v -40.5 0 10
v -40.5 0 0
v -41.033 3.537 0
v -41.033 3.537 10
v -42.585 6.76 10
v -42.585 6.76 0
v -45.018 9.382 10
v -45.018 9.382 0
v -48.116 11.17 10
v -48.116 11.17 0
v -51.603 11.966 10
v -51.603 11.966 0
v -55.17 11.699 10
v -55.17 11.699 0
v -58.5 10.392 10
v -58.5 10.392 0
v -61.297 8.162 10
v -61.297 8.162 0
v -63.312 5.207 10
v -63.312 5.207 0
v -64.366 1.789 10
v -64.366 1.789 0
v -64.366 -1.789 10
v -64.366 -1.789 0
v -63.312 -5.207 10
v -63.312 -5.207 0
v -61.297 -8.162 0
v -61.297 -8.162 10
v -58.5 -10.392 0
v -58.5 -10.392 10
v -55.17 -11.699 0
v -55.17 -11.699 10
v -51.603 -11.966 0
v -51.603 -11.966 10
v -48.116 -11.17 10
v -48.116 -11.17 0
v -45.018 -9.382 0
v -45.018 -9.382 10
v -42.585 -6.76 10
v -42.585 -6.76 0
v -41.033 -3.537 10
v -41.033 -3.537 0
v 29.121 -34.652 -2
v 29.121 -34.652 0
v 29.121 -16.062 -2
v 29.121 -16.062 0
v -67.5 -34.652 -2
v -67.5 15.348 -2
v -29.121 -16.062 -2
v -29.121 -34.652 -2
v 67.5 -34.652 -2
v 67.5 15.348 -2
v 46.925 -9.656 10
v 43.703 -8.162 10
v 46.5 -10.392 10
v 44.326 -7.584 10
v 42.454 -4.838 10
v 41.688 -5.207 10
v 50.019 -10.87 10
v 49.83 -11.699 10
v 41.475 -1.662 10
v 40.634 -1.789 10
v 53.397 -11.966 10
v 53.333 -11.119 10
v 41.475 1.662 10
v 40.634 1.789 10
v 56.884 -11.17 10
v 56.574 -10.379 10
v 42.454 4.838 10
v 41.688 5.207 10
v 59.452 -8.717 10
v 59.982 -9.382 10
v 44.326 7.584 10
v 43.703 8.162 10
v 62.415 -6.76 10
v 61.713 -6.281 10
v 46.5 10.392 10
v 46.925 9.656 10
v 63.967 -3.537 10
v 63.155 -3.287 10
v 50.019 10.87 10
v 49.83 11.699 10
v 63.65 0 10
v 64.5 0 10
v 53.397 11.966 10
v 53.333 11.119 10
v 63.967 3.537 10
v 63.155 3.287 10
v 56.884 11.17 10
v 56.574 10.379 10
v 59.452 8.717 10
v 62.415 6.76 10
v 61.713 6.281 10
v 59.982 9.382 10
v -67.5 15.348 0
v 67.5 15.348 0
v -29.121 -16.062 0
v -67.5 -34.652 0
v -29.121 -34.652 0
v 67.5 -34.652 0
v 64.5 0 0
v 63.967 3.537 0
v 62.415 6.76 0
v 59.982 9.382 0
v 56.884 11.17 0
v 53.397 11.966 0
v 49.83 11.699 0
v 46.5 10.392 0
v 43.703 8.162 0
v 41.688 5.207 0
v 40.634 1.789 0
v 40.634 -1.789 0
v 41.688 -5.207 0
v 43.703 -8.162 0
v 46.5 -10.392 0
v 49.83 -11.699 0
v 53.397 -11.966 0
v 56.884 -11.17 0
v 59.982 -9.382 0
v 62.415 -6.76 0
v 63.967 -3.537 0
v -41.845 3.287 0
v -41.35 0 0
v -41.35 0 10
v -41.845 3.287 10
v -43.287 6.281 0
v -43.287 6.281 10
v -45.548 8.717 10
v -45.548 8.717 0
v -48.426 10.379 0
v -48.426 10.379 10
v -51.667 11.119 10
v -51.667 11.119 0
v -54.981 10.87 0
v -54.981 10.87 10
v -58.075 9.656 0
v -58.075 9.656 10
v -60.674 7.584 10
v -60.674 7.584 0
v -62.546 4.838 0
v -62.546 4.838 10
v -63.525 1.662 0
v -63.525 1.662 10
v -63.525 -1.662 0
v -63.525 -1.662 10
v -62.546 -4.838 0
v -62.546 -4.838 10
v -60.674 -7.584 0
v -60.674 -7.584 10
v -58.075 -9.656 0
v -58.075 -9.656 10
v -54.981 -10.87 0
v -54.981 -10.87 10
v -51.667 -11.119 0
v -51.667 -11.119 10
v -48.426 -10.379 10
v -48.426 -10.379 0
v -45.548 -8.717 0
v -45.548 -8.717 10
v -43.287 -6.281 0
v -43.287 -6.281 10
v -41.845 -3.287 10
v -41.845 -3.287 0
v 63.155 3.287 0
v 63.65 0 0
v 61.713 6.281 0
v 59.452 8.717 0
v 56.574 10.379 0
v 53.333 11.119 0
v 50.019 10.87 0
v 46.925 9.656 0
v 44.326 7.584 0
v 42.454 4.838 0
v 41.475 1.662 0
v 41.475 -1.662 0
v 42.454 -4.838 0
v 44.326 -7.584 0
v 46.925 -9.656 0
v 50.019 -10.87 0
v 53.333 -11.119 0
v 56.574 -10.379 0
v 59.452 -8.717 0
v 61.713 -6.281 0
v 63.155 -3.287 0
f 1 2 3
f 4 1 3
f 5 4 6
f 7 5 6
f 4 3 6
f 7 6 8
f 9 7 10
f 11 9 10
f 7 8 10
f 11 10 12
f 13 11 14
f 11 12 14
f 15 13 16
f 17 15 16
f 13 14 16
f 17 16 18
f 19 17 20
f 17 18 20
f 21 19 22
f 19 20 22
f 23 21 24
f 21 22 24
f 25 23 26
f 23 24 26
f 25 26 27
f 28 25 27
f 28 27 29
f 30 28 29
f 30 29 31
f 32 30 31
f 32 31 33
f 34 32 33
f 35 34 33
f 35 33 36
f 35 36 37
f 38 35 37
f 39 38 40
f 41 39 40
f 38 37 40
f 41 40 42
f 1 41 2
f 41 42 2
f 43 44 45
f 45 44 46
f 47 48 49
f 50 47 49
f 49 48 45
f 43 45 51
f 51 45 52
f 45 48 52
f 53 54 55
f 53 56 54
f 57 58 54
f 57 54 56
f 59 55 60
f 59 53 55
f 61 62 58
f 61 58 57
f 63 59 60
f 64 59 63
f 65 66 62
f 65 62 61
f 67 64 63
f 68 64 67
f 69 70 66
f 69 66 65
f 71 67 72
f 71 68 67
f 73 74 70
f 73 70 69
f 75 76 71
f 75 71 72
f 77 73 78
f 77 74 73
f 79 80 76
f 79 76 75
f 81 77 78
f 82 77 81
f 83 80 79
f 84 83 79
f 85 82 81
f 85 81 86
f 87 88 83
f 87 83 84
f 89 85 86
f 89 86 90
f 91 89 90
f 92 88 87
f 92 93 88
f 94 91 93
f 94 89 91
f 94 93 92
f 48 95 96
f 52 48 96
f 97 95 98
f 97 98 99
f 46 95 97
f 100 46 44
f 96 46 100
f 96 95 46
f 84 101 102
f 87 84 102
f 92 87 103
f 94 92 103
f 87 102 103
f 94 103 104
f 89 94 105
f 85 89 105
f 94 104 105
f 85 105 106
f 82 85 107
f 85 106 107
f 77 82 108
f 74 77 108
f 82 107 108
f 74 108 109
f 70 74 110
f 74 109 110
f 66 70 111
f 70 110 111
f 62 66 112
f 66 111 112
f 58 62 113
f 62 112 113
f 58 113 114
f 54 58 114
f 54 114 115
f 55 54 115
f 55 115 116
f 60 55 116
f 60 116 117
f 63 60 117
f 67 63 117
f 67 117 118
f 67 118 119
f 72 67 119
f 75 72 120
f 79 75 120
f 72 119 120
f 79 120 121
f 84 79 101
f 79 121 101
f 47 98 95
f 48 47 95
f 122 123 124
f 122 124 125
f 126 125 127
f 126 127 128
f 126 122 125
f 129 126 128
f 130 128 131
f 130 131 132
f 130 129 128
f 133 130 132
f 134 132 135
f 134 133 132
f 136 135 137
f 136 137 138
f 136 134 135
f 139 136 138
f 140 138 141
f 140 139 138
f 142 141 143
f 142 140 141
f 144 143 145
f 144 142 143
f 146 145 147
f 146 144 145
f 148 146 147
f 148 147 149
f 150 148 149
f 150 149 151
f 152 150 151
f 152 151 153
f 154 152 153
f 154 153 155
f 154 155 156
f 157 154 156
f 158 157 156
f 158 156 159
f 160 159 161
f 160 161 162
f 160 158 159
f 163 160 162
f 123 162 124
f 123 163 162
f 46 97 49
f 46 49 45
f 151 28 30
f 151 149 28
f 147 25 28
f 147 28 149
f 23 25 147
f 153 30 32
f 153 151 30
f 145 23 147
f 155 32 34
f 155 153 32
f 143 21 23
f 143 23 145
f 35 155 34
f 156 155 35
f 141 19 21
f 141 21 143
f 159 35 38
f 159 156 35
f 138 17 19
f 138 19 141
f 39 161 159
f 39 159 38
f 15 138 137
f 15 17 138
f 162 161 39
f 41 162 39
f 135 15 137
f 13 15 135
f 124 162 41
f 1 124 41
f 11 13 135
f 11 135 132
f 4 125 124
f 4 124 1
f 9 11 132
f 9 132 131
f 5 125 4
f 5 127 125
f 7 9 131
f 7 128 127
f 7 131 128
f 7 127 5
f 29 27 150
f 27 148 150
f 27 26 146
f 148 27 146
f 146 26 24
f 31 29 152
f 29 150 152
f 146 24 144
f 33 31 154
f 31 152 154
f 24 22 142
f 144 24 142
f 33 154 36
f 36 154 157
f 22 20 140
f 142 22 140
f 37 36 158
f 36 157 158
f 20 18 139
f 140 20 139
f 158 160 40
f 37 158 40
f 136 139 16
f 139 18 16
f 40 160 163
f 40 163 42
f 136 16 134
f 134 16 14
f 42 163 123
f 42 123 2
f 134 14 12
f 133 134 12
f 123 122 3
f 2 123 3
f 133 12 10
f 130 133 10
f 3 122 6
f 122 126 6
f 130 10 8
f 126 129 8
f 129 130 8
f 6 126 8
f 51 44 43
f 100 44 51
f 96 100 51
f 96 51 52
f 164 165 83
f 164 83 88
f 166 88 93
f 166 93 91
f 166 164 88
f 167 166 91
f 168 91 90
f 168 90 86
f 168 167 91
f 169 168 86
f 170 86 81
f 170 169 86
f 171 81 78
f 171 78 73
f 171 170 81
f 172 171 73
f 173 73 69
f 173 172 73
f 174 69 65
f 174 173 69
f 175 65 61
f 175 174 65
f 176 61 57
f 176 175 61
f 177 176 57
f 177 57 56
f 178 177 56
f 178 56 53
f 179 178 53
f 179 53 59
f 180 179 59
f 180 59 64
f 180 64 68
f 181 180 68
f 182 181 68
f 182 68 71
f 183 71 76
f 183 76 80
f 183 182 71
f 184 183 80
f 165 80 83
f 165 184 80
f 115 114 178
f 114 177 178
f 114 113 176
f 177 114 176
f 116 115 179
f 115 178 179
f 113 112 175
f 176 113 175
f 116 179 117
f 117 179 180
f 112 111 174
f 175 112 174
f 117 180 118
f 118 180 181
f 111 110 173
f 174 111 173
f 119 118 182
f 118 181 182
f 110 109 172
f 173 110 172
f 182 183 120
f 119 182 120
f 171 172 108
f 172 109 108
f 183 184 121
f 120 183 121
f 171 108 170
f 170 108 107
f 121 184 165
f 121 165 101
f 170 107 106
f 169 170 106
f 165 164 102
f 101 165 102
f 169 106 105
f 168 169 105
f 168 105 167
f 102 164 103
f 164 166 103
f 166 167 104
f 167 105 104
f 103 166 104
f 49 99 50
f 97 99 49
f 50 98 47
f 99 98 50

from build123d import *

# Parameters (mm, degrees)
F0_R     = 12
F0_R_2   = 11.15
F1_DEPTH = 10
F2_W     = 135
F2_H     = 50
F3_DEPTH = 2
F4_W     = 58.242576
F4_H     = 37.179895
F5_DEPTH = 25.4


with BuildPart() as f1:
    # F0 (on Top) → F1 (new body)
    with BuildSketch(Plane.XY):
        with Locations((-52.5, 0)):
            Circle(F0_R)
        with Locations((-52.5, 0)):
            Circle(F0_R_2, mode=Mode.SUBTRACT)
        with Locations((52.5, 0)):
            Circle(F0_R)
        with Locations((52.5, 0)):
            Circle(F0_R_2, mode=Mode.SUBTRACT)
    extrude(amount=F1_DEPTH)


with BuildPart() as f3:
    # F2 (on Top) → F3 (new body)
    with BuildSketch(Plane.XY):
        with Locations((-3e-06, -9.651998)):
            Rectangle(F2_W, F2_H)
    extrude(amount=-F3_DEPTH)

    # F4 (on face) → F5 (cut)
    with BuildSketch(Plane.XY):
        with Locations((-3e-06, -34.651998)):
            Rectangle(F4_W, F4_H)
    extrude(amount=-F5_DEPTH, mode=Mode.SUBTRACT)


solid = Compound([f1.part, f3.part])
